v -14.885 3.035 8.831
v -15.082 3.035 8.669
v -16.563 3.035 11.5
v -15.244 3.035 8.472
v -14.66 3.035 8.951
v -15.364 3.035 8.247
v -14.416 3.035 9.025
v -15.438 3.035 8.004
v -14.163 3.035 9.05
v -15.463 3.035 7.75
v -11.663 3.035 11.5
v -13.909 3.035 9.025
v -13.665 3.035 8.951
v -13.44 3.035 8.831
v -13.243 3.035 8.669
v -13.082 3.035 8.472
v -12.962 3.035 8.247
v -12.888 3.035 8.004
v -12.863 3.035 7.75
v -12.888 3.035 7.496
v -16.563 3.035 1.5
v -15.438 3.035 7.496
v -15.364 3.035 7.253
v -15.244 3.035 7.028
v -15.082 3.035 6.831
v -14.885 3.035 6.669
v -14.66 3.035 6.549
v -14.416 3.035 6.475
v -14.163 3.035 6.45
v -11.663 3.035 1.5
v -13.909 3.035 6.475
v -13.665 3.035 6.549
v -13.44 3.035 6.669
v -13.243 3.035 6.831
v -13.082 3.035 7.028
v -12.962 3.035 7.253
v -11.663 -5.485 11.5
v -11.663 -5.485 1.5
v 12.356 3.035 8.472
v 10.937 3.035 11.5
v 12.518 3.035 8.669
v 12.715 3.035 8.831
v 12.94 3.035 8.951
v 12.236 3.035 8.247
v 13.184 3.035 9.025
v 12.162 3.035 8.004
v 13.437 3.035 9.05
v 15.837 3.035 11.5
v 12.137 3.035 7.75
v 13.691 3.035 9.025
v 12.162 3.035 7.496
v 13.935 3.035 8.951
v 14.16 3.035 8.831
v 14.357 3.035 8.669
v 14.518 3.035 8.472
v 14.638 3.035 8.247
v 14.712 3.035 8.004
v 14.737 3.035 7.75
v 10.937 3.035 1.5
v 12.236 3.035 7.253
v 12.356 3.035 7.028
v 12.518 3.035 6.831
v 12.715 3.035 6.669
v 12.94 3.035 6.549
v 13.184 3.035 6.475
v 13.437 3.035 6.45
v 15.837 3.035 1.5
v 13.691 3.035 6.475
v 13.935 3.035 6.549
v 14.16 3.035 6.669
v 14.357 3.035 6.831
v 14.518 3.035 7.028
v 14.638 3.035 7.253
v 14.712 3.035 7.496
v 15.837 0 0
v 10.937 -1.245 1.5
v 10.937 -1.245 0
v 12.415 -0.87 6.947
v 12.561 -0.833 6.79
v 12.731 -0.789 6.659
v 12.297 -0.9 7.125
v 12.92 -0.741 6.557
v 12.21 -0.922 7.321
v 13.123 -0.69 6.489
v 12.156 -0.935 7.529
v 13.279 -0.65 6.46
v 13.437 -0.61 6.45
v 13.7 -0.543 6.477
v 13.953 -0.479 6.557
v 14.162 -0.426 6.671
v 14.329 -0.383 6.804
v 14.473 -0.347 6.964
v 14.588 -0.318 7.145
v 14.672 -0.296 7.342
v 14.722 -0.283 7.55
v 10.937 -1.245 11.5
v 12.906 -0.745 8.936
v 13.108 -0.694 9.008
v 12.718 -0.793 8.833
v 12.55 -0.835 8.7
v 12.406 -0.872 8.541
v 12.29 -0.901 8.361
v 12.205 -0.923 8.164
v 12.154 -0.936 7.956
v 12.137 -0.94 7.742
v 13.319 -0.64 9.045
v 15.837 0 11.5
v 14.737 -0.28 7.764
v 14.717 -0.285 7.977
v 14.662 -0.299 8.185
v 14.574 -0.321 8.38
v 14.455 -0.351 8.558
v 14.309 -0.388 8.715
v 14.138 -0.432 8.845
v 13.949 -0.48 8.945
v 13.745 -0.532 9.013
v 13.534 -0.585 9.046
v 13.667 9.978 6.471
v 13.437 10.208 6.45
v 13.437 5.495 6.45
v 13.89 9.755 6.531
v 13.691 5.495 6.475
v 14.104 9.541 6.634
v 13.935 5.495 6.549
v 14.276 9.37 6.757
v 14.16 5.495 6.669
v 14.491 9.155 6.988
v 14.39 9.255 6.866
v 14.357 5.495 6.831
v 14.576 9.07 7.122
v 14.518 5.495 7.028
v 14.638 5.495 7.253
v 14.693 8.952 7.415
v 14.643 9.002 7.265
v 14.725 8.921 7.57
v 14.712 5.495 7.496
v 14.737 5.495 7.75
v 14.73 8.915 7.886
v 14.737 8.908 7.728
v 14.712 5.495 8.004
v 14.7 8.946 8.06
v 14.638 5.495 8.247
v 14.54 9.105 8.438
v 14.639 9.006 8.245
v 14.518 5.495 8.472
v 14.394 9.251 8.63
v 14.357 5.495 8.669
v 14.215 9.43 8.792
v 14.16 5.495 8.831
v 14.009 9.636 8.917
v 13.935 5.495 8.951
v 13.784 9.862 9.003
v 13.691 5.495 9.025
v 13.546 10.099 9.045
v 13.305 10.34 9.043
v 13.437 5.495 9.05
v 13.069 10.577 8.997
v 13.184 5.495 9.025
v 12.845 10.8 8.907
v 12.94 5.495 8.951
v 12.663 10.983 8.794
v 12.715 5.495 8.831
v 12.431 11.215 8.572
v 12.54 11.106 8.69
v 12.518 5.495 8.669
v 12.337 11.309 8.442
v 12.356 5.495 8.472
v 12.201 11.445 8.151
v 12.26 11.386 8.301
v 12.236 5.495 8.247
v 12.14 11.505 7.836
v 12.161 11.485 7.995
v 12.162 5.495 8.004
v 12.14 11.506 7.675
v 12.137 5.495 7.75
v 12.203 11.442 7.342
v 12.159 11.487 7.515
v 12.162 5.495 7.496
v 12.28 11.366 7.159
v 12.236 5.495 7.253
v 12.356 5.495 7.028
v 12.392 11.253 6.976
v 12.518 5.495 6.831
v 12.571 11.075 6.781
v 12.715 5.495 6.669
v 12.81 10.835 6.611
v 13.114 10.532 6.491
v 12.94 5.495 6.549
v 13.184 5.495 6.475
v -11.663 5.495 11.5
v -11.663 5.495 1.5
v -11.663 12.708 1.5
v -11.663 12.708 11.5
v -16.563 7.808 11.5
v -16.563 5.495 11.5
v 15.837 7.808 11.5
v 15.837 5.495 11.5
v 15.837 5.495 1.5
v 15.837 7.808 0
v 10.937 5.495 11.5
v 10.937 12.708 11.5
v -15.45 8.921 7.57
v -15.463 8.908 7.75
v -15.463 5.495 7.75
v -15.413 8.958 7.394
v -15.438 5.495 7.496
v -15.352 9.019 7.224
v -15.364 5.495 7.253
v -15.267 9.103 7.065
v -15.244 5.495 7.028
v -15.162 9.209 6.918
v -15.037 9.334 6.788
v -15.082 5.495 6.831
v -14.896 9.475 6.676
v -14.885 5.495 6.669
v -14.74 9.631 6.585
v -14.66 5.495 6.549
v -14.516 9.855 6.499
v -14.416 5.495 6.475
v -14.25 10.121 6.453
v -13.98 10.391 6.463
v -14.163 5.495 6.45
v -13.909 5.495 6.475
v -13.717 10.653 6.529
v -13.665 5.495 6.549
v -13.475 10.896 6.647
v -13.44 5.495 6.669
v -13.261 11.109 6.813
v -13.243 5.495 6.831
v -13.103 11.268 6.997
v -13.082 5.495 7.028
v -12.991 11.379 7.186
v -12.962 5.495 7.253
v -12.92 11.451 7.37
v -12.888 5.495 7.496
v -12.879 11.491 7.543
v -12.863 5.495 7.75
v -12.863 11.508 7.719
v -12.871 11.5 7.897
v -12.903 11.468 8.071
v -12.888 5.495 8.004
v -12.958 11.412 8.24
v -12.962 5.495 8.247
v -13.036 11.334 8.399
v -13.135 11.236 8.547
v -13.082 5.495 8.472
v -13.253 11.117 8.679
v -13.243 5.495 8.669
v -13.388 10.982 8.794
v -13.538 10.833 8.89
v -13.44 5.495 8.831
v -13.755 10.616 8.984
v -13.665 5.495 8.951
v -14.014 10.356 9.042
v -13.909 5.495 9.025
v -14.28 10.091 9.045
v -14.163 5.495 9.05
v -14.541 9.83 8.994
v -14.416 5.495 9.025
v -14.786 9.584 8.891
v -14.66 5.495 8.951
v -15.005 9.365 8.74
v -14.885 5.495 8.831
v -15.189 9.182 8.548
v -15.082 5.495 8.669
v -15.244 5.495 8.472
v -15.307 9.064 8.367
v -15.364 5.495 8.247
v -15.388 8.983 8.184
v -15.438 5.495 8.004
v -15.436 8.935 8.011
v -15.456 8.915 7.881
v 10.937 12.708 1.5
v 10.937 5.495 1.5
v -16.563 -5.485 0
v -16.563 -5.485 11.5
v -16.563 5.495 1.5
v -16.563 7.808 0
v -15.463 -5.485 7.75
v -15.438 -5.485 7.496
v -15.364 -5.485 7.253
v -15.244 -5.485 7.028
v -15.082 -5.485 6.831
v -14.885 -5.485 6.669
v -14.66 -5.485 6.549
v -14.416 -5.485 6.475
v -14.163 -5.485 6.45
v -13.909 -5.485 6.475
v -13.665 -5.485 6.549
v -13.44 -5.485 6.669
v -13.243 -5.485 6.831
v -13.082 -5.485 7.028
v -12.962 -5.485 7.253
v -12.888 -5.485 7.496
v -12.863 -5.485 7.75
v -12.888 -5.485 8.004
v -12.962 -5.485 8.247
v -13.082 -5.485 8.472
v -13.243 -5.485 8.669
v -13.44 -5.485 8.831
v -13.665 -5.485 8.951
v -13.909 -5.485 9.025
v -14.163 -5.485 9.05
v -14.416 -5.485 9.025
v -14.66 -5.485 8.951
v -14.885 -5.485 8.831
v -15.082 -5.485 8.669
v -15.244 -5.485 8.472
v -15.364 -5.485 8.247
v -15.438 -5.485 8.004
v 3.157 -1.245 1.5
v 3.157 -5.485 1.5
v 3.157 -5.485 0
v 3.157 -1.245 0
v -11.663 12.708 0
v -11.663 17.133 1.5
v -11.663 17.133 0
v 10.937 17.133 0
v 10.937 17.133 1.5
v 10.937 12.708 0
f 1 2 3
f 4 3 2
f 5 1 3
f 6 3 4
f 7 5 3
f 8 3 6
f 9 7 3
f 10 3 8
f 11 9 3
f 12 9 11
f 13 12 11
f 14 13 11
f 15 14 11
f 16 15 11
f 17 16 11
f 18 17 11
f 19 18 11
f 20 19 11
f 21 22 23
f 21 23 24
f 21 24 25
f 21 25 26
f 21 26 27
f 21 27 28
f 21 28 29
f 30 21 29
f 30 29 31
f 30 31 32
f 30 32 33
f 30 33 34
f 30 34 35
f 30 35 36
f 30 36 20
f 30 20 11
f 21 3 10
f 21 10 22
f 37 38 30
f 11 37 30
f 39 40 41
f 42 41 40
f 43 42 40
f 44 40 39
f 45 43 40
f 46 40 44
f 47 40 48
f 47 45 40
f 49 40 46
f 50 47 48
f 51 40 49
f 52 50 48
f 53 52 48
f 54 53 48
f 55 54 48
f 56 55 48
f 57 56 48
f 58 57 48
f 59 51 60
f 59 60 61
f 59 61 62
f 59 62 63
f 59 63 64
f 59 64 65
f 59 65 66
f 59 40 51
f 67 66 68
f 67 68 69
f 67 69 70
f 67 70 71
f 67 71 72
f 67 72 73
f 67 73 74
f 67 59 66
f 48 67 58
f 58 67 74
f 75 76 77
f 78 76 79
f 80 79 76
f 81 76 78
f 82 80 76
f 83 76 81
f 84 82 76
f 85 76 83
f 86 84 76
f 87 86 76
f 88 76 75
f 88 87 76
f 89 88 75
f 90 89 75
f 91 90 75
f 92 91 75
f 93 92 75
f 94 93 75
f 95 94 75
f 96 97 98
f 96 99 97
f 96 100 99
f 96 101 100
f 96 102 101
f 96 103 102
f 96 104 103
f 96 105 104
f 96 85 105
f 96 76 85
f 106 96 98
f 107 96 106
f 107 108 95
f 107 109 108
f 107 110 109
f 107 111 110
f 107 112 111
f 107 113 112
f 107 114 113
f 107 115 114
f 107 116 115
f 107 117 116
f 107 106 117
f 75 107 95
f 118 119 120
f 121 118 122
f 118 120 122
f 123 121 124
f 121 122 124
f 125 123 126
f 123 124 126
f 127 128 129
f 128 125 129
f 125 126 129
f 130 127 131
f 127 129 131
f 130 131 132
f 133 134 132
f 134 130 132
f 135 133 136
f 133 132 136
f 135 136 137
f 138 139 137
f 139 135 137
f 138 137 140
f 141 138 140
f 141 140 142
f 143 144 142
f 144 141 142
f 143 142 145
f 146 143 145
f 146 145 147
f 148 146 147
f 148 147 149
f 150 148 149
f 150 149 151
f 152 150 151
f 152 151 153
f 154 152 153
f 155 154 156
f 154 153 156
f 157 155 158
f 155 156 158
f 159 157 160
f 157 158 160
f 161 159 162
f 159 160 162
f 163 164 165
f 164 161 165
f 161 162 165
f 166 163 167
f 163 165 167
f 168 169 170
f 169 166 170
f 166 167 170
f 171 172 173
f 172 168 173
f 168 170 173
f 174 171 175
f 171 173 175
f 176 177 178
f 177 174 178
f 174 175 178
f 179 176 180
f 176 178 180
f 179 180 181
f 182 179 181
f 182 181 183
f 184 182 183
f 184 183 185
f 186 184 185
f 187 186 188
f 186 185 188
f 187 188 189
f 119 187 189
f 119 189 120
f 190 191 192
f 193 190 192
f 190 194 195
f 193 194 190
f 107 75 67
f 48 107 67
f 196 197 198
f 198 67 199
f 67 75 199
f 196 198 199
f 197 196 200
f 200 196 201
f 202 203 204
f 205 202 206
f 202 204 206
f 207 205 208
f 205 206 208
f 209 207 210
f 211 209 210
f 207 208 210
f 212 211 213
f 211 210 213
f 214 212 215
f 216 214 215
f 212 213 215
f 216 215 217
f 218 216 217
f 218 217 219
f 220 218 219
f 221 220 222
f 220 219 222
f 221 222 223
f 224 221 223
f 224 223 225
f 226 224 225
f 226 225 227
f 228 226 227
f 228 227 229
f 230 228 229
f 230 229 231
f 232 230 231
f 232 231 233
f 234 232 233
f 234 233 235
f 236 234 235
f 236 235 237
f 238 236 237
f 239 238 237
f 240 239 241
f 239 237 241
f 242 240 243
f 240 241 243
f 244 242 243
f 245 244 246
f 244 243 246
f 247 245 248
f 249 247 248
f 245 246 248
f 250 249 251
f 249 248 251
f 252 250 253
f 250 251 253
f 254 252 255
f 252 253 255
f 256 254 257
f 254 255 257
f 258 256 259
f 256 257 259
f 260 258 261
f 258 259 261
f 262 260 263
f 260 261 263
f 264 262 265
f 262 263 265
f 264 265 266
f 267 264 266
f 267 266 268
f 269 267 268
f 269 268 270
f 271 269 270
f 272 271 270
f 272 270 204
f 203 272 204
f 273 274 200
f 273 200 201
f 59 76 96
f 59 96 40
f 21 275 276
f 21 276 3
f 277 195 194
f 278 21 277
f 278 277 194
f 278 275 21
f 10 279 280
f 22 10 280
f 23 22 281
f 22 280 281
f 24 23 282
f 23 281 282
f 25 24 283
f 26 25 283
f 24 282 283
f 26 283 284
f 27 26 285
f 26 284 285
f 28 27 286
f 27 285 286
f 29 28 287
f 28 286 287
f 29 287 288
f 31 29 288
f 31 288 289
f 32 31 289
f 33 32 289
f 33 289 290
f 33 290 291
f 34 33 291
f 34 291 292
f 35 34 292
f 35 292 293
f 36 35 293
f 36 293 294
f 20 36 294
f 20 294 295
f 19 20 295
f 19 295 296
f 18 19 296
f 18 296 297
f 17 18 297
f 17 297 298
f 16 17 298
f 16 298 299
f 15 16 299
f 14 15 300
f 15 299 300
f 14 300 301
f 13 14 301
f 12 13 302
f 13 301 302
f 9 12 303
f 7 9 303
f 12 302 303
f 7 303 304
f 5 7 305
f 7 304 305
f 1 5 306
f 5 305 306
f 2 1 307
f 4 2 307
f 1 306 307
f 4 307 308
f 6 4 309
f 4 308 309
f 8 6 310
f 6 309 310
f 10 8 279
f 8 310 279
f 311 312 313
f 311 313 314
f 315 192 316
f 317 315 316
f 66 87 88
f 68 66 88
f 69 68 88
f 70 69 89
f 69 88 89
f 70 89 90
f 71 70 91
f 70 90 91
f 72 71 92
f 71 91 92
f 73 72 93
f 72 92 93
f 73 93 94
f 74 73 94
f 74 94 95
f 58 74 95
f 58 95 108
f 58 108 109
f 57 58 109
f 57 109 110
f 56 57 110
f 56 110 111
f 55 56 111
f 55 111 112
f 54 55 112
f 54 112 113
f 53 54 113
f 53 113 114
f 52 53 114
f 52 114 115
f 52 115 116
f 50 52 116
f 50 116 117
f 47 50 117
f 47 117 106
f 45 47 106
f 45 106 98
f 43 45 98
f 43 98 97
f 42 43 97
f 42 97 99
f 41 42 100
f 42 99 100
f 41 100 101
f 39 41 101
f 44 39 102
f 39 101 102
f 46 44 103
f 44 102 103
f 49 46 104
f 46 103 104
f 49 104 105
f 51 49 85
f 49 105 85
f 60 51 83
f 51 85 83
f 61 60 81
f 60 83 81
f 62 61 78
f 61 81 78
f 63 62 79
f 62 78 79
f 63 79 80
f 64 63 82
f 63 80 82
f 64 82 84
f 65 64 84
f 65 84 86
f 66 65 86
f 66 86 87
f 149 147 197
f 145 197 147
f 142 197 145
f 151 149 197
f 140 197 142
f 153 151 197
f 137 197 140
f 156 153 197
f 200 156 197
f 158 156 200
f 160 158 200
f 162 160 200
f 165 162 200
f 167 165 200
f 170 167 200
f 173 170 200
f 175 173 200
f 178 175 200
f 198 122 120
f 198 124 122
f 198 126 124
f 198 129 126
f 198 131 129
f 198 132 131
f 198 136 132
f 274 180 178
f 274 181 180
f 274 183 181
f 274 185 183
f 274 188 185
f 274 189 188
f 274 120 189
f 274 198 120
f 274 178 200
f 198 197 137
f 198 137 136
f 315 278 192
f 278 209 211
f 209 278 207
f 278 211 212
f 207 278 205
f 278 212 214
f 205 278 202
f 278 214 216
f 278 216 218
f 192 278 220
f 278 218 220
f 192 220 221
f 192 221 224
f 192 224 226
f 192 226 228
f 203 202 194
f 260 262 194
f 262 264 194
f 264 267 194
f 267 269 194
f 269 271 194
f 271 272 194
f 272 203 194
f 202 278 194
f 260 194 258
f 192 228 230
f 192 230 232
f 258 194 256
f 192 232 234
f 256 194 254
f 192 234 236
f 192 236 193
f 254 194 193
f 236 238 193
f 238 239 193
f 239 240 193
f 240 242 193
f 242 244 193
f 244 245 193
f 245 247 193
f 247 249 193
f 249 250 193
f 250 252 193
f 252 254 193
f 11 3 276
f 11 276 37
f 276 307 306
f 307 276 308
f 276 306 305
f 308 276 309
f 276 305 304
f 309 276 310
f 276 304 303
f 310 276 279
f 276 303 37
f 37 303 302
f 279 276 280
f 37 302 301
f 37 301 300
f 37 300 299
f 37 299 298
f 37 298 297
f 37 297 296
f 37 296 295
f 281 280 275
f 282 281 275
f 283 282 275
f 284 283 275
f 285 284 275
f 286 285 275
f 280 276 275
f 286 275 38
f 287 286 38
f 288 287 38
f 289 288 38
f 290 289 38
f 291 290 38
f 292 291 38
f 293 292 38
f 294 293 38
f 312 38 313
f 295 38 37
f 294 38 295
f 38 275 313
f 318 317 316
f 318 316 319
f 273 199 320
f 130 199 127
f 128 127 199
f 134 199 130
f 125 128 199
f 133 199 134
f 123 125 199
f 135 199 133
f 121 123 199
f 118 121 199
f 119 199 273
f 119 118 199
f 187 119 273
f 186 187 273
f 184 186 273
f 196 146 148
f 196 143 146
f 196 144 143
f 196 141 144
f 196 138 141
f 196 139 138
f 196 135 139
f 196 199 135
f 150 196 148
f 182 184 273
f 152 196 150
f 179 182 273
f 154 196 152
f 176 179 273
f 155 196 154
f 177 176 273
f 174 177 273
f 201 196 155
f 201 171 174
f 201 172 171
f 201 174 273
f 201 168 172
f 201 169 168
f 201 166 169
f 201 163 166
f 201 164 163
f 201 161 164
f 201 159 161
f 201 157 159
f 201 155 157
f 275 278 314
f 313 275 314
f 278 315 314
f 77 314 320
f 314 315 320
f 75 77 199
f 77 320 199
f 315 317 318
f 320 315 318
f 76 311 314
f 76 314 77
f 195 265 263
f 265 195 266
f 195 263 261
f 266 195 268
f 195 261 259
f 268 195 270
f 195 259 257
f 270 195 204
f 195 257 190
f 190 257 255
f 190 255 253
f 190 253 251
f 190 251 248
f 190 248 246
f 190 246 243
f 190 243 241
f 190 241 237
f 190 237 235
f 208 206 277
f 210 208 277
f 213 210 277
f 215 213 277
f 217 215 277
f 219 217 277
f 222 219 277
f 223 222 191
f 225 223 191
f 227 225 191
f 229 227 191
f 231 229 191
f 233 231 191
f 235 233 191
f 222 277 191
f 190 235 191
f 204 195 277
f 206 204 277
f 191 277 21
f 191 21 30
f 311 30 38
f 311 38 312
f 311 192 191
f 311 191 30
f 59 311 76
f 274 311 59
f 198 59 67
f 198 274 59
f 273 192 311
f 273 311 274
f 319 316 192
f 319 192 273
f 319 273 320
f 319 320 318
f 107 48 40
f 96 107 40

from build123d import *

# Parameters (mm, degrees)
SKETCH_1_W          = 32.4
SKETCH_1_H          = 30
EXTRUDE_1_DEPTH     = 1.5
SKETCH_2_W          = 4.9
SKETCH_2_H          = 8.52
EXTRUDE_2_DEPTH     = 10
CUT_EXTRUDE_1_DEPTH = 11.5
SKETCH_4_R          = 1.3
CUT_EXTRUDE_2_DEPTH = 31.5


with BuildPart() as part:
    # 草图1 → 凸台-拉伸1 (new body)
    with BuildSketch(Plane.XY):
        with Locations((-0.362675268, 2.133428793)):
            Rectangle(SKETCH_1_W, SKETCH_1_H)
    extrude(amount=EXTRUDE_1_DEPTH)

    # 草图2 → 凸台-拉伸2 (add)
    with BuildSketch(Plane.XY.offset(1.5)):
        with Locations((-14.112675268, -1.225199495)):
            Rectangle(SKETCH_2_W, SKETCH_2_H)
        Polygon((-16.562675268, 5.494800505), (-11.662675268, 5.494800505), (-11.662675268, 12.70812694), (-16.562675268, 7.80812694), align=None)
        Polygon((10.937324732, 5.494800505), (10.937324732, 12.70812694), (15.837324732, 7.80812694), (15.837324732, 5.494800505), align=None)
        Polygon((10.937324732, 3.034800505), (15.837324732, 3.034800505), (15.837324732, 0), (10.937324732, -1.245199495), align=None)
    extrude(amount=EXTRUDE_2_DEPTH)

    # 草图3 → 切除-拉伸1 (cut)
    with BuildSketch(Plane.XY.offset(1.5)):
        Polygon((-16.562675268, 7.80812694), (-11.662675268, 12.70812694), (-11.662675268, 17.133428793), (-16.562675268, 17.133428793), align=None)
        Polygon((15.837324732, 7.80812694), (10.937324732, 12.70812694), (10.937324732, 17.133428793), (15.837324732, 17.133428793), align=None)
        Polygon((-16.562675268, -12.866571207), (-16.562675268, -8.702000753), (-16.562675268, -5.485199495), (3.157324732, -5.485199495), (3.157324732, -1.245199495), (10.937324732, -1.245199495), (15.837324732, 0), (15.837324732, -12.866571207), align=None)
    extrude(amount=-CUT_EXTRUDE_1_DEPTH, mode=Mode.SUBTRACT)

    # 草图4 → 切除-拉伸2 (cut)
    with BuildSketch(Plane.XZ.offset(5.485199495)):
        with Locations(Location((-14.162675268, 7.75, 0), (0, 0, 180))):
            Circle(SKETCH_4_R)
        with Locations(Location((13.437324732, 7.75, 0), (0, 0, 270))):
            Circle(SKETCH_4_R)
    extrude(amount=-CUT_EXTRUDE_2_DEPTH, mode=Mode.SUBTRACT)


solid = part.part
